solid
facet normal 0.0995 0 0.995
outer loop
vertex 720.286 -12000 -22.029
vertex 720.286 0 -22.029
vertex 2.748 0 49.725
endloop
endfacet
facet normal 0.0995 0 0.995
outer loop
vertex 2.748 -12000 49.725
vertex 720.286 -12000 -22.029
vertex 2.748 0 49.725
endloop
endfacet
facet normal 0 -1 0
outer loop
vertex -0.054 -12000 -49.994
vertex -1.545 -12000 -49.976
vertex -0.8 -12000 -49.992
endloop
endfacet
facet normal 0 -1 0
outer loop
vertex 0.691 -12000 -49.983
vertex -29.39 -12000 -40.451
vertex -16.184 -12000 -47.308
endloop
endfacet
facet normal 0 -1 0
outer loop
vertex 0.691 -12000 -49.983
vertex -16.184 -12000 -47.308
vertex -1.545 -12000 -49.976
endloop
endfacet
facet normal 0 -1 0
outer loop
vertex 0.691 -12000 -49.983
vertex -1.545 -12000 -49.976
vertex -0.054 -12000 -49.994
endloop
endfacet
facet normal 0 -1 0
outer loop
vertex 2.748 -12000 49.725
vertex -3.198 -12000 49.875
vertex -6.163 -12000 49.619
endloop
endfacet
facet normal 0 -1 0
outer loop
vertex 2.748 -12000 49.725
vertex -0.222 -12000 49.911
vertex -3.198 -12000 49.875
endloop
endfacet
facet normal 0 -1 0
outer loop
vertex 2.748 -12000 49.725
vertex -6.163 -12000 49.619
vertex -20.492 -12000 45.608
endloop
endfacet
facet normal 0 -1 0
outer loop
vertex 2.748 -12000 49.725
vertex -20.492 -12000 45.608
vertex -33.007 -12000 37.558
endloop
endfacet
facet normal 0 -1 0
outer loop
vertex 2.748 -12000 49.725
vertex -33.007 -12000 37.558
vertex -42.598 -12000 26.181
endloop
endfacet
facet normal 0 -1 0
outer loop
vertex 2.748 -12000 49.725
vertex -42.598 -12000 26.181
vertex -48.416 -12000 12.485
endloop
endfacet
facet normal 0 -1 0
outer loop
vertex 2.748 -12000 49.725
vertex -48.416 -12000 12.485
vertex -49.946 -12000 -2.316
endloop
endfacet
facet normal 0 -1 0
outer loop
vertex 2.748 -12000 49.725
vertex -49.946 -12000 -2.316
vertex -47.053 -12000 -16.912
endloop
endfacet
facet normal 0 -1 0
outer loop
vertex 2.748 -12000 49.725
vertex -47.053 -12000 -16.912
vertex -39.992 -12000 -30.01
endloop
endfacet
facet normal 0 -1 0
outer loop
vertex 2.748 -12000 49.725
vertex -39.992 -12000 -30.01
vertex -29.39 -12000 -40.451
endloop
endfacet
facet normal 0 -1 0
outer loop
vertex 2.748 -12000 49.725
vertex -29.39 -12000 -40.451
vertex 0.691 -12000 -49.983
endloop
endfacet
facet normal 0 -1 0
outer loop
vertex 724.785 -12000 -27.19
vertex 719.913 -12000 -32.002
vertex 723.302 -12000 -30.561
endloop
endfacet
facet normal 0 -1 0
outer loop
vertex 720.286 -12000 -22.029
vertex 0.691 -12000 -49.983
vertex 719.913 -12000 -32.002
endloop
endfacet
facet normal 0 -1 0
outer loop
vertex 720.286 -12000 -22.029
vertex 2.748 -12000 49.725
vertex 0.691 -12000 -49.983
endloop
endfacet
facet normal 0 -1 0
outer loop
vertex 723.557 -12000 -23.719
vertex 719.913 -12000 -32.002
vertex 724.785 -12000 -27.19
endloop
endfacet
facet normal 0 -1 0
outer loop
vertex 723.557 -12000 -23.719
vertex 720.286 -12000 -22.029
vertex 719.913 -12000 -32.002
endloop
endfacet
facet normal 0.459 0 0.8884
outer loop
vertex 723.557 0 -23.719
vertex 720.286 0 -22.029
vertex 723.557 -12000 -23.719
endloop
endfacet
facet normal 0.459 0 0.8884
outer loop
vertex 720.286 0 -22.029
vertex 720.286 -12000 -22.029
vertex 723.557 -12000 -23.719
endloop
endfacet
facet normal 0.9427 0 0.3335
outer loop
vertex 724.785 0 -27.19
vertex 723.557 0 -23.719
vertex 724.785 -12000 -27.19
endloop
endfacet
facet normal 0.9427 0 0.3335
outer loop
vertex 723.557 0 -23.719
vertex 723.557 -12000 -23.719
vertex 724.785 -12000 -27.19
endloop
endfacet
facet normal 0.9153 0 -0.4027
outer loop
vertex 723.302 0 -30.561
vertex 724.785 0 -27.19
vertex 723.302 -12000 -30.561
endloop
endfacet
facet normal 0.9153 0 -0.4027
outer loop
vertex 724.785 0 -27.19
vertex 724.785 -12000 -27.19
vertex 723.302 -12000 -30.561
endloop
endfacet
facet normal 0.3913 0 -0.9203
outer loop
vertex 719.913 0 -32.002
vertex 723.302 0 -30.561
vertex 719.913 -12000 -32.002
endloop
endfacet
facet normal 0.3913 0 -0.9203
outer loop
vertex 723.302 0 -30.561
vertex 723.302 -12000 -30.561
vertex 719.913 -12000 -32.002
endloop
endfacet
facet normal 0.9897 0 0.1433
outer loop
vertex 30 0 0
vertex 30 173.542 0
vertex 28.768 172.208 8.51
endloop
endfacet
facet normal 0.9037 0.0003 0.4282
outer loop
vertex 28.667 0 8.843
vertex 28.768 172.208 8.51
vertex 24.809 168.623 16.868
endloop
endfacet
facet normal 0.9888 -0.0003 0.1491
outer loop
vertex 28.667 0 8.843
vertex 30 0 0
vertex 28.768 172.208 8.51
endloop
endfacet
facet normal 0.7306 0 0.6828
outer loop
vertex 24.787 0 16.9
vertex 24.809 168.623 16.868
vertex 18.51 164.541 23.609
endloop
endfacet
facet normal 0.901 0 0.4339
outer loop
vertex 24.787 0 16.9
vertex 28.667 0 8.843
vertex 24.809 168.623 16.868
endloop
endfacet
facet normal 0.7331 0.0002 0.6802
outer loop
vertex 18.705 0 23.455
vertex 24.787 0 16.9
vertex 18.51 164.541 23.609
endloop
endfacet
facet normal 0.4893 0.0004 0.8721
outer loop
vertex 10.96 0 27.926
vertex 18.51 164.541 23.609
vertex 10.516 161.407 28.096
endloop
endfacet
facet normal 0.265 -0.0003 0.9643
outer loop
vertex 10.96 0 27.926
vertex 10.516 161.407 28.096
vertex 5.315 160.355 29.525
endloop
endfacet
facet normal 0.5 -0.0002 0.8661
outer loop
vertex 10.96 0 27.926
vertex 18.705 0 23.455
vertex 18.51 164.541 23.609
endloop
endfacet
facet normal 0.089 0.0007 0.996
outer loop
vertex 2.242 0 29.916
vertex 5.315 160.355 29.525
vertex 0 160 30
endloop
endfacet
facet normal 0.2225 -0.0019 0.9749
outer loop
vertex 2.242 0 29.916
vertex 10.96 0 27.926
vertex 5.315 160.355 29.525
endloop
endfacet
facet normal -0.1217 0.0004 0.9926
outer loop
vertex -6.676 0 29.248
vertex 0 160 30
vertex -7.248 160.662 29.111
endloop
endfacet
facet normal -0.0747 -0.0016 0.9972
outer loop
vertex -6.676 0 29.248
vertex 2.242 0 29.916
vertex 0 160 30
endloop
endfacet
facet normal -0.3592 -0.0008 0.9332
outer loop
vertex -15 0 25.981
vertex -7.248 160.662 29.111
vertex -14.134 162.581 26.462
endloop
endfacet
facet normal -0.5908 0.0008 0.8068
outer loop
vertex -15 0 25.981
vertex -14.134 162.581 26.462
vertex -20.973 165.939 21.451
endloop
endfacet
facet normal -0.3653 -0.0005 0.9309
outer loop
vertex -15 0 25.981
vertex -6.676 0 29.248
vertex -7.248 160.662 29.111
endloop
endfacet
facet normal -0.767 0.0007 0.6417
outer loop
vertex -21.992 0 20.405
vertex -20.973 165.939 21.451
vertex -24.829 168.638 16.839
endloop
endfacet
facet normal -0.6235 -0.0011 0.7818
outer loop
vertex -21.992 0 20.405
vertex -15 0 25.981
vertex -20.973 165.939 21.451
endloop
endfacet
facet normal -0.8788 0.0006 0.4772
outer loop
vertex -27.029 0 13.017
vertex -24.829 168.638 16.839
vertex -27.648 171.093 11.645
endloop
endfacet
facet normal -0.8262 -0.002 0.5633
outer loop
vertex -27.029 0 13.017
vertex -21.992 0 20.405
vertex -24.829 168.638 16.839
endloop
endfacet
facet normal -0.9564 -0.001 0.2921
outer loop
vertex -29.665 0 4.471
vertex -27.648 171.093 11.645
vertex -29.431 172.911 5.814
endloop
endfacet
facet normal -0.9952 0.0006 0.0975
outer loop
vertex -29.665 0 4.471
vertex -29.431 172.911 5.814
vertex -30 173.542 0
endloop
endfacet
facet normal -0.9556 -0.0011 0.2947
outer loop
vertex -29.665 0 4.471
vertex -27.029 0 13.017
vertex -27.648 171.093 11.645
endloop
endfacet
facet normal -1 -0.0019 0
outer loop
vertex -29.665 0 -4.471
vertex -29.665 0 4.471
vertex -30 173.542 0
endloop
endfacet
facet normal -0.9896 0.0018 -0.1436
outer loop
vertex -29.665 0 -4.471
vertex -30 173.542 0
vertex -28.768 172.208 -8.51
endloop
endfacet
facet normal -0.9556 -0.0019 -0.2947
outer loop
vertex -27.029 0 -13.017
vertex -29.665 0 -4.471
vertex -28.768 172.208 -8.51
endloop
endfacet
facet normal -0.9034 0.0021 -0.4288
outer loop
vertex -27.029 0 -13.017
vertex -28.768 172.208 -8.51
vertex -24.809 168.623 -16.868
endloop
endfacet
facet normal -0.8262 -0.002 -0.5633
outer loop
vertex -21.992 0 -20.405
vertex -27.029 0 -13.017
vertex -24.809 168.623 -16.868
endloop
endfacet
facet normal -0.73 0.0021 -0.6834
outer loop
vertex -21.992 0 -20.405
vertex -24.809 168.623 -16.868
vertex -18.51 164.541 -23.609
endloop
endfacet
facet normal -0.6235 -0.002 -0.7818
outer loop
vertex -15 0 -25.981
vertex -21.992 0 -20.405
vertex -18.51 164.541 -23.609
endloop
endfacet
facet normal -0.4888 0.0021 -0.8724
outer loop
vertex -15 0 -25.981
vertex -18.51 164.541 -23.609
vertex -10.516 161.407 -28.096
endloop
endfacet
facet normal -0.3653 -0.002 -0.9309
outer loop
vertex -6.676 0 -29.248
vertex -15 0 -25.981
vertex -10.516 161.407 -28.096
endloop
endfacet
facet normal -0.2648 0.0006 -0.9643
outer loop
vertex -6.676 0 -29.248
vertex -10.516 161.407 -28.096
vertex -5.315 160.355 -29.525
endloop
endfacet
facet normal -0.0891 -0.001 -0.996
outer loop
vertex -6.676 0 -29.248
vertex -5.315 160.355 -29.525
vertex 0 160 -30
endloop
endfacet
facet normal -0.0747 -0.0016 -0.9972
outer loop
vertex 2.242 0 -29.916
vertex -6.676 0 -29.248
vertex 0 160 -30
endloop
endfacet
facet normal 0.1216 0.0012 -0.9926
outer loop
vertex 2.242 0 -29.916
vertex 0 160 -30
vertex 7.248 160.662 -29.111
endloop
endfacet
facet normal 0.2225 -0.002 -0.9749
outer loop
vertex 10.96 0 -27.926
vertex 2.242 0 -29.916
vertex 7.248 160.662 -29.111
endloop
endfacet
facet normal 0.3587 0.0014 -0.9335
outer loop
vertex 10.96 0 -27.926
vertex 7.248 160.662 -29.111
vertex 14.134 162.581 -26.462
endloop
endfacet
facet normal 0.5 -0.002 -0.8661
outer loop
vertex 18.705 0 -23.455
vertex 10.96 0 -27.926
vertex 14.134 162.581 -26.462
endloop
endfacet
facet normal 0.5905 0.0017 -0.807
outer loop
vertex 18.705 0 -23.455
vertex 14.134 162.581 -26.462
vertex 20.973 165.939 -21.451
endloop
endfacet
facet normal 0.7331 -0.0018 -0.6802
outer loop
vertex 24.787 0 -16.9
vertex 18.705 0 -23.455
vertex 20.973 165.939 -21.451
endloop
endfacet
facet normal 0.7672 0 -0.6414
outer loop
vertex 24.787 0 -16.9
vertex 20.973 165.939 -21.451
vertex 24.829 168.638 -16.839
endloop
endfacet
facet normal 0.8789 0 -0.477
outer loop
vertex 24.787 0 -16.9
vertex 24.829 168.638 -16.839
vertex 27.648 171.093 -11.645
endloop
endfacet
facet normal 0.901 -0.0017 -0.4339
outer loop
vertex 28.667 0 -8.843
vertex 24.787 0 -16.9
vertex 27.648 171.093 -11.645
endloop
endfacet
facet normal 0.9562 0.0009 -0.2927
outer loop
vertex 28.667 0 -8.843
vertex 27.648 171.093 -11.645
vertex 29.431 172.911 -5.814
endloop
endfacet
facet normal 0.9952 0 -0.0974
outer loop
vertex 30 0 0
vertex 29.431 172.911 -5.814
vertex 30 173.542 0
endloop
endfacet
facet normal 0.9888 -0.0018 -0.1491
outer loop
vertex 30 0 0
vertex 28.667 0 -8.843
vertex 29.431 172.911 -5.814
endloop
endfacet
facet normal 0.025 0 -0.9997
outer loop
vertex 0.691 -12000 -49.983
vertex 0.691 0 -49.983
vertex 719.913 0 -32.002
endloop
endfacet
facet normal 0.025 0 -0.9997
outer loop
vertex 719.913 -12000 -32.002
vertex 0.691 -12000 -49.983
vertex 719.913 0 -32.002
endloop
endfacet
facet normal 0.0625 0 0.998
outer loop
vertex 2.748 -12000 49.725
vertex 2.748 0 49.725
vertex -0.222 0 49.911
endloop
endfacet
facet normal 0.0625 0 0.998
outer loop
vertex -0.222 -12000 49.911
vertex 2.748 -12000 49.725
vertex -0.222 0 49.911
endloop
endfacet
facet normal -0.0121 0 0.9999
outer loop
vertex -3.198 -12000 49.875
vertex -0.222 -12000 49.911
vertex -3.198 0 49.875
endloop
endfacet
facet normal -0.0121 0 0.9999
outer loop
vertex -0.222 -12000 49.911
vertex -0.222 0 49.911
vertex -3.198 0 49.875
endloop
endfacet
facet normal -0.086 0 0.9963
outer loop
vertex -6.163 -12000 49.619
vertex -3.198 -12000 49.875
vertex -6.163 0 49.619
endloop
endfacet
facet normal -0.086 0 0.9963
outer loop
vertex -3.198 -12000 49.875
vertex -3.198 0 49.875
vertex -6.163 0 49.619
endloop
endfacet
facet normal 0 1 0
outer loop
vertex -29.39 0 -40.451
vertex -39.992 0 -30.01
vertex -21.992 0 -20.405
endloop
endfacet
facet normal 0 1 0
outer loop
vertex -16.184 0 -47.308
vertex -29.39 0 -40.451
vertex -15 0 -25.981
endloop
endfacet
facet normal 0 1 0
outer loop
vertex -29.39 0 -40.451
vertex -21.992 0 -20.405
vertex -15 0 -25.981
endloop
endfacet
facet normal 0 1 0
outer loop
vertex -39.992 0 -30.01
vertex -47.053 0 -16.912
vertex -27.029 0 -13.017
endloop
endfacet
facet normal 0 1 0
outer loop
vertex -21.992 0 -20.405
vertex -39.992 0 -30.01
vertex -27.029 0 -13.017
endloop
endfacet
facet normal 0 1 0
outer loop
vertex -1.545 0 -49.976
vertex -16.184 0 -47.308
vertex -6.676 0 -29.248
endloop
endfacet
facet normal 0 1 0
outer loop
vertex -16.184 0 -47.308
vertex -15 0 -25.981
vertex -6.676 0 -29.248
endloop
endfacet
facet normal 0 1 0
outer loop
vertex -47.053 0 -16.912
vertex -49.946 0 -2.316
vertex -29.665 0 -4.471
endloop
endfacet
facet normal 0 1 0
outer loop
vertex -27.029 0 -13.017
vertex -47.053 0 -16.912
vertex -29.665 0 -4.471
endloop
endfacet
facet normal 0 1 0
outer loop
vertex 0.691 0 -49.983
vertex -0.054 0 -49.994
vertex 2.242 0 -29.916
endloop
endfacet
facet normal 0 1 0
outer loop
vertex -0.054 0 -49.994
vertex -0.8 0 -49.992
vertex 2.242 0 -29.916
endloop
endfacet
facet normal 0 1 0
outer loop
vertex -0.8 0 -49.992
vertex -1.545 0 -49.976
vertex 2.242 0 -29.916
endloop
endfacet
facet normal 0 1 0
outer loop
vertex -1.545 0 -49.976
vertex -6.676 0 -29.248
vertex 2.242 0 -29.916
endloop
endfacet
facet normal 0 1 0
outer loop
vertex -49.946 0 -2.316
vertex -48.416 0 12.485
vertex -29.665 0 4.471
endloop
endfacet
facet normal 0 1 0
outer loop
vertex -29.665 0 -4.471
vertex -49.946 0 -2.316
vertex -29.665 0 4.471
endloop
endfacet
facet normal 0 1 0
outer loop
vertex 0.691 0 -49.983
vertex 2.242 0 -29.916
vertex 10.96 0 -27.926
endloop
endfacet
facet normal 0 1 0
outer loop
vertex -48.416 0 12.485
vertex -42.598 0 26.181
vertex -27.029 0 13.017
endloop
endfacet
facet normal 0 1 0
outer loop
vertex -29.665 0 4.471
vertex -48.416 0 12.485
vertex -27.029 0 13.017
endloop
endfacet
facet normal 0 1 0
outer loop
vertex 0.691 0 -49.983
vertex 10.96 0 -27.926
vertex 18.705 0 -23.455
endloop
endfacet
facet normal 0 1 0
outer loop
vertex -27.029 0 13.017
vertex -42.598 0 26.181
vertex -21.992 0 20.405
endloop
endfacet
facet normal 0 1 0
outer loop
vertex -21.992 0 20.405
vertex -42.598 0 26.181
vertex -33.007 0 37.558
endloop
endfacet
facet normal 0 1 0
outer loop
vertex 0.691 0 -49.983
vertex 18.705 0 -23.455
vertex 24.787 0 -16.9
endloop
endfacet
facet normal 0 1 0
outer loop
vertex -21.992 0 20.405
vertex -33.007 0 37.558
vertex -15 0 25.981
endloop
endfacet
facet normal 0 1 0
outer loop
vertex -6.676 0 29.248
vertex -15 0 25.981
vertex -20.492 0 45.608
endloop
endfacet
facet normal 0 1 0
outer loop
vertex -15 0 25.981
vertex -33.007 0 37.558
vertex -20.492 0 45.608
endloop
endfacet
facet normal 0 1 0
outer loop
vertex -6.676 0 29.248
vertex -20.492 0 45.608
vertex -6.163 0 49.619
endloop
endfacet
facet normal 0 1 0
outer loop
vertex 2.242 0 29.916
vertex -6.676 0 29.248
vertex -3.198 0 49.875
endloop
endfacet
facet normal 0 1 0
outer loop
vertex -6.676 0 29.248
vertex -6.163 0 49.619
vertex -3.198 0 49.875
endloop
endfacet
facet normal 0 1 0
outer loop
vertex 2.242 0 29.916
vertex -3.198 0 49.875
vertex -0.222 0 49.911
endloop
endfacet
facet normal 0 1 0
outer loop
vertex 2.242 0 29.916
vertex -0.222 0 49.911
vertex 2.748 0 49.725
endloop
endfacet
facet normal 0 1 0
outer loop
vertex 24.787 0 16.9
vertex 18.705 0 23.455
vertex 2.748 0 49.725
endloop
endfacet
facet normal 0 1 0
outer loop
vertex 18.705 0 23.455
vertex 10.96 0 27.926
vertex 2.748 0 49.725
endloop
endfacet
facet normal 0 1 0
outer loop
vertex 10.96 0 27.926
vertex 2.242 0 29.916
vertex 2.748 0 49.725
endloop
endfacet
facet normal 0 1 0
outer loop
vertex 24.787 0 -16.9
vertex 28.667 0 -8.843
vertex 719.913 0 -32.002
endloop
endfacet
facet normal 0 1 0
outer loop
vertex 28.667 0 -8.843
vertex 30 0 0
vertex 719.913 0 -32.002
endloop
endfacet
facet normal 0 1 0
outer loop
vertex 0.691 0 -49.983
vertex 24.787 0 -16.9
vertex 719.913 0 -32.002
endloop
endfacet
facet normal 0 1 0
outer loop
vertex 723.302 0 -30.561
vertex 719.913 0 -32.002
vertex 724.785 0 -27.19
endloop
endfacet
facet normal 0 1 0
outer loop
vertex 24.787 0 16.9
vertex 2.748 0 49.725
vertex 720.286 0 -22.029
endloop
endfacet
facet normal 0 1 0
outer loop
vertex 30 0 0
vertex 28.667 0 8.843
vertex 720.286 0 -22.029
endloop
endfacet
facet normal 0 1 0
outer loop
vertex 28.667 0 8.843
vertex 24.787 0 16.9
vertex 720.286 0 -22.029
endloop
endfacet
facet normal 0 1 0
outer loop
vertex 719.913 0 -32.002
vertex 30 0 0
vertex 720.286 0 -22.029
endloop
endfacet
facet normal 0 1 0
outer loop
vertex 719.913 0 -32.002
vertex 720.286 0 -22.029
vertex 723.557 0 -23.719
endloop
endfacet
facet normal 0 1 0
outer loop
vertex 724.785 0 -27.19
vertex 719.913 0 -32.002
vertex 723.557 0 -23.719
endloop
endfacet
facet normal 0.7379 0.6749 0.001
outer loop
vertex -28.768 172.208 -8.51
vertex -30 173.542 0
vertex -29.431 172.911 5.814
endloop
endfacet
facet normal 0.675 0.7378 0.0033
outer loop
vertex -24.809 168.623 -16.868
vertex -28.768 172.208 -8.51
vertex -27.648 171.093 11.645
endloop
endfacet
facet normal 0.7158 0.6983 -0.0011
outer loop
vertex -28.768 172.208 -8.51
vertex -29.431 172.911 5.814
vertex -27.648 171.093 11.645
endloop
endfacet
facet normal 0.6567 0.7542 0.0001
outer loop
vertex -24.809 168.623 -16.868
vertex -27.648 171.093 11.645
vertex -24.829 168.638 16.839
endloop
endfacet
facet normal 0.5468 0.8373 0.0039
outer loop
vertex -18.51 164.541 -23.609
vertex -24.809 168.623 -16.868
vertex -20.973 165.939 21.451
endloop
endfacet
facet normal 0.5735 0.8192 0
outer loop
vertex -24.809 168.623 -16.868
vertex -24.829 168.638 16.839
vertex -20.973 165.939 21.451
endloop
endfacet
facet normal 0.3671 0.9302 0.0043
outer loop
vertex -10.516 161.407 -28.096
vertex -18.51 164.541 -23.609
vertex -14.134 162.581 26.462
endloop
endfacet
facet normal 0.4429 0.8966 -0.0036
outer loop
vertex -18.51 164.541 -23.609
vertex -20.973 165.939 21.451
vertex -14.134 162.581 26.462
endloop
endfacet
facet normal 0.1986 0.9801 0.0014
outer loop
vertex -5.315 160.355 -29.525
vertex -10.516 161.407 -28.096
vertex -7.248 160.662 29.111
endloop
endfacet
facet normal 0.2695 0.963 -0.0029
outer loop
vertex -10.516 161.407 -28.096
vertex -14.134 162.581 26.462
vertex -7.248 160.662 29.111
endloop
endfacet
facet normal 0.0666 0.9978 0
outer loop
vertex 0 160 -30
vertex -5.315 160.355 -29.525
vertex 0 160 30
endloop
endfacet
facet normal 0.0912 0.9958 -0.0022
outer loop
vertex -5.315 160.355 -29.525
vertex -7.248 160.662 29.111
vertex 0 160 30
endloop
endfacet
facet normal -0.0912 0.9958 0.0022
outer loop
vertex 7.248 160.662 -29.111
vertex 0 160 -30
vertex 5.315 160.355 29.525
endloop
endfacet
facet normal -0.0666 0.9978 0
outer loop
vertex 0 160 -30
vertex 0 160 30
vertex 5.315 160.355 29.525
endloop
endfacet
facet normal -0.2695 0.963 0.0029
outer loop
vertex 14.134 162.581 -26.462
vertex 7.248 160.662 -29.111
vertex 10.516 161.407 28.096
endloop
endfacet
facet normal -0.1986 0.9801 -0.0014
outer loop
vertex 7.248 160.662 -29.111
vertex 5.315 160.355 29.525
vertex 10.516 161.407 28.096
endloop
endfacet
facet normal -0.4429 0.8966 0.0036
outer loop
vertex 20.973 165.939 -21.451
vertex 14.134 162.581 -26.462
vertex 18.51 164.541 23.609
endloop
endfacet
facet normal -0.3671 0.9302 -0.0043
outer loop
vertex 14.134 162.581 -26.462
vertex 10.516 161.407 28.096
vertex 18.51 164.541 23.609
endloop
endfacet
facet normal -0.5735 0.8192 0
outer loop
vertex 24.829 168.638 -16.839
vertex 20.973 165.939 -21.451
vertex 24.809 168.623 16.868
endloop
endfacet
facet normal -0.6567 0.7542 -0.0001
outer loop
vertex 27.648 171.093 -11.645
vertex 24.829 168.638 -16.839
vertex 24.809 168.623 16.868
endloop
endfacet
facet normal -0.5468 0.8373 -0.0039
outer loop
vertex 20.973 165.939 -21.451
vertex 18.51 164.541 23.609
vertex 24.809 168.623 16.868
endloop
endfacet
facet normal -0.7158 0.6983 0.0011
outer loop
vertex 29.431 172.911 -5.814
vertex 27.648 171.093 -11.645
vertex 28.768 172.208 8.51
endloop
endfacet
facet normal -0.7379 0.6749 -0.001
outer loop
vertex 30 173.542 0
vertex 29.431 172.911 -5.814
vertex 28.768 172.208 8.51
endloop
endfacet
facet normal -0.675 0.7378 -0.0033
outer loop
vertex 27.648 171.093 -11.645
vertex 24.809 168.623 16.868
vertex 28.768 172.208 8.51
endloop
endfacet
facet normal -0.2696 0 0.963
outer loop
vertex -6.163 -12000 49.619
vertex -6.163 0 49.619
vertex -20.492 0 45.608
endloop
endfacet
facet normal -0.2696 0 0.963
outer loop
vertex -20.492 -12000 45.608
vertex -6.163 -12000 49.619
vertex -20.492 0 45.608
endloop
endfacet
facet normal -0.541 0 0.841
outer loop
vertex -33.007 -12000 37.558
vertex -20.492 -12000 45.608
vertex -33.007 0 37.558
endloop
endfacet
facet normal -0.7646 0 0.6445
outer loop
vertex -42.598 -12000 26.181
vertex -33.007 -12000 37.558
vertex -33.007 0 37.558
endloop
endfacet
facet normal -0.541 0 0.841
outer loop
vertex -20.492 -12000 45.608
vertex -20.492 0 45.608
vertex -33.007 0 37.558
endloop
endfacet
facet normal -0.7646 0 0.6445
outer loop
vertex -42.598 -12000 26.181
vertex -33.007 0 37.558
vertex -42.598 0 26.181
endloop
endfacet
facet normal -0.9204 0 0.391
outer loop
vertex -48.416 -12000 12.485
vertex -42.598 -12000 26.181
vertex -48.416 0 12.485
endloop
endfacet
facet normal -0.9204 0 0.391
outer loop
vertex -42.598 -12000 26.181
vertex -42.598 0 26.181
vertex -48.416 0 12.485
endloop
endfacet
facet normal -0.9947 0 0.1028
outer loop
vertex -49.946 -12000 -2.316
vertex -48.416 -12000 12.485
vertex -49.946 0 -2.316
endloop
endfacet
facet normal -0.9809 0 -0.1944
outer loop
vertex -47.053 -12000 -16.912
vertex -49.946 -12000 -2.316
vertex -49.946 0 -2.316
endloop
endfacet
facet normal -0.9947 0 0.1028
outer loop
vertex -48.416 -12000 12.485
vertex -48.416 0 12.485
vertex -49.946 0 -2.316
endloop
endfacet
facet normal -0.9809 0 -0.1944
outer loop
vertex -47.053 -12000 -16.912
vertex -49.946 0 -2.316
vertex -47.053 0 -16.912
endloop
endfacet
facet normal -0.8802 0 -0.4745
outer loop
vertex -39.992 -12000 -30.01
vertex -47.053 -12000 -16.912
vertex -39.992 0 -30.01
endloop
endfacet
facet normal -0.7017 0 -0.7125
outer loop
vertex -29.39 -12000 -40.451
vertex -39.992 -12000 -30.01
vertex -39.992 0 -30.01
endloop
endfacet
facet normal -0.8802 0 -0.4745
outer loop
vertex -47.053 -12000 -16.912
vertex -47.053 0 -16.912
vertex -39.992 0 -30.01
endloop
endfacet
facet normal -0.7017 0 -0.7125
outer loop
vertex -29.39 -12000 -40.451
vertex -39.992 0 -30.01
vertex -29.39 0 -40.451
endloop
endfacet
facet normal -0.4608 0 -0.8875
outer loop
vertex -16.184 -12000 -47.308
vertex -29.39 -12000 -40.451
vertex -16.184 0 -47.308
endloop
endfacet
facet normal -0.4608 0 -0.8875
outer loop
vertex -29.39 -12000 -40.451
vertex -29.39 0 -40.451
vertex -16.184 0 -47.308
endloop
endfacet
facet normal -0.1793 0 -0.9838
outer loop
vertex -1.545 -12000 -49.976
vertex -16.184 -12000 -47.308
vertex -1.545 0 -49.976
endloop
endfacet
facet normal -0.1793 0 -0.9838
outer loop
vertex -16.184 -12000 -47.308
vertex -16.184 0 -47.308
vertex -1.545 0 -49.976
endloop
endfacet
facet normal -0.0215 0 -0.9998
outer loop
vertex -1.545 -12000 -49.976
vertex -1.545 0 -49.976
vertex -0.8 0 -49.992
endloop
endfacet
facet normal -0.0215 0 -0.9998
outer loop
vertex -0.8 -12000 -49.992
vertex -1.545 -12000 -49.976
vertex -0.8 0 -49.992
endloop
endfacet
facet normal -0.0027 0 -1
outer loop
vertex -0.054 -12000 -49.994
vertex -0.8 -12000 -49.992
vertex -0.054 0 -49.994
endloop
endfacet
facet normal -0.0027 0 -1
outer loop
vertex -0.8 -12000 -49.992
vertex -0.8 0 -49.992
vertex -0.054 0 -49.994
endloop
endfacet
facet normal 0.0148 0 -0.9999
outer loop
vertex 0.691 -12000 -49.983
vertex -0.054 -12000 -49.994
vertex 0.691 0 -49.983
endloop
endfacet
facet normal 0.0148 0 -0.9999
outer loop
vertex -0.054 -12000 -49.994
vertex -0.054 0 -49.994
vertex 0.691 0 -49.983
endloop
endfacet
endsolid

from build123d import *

# Parameters (mm, degrees)
F1_DEPTH    = 12000
F2_T1_DEPTH = 12030.8724111993
F2_T3_DEPTH = 12007.7249640069
F3_R        = 5
F4_R        = 30
F5_DEPTH    = 200
F7_DEPTH    = 50


# Not quite as in the source:
# - a fillet or chamfer that OpenCascade refuses, or shapes differently, is made with other operations: its cross-section is extruded or revolved along the edge and cut away or added


with BuildPart() as f1:
    # F0 (on Front) → F1 (new body)
    with BuildSketch(Plane.XZ):
        with BuildLine():
            Line((0, -30), (0, 50))
            ThreePointArc((0, 50), (-50, 0), (0, -50))
            Line((0, -50), (0, -30))
        make_face()
        Polygon((800, -30), (0, 50), (0, -30), align=None)
        Polygon((800, -30), (0, -30), (0, -50), align=None)
    extrude(amount=F1_DEPTH)

    # F2: fillet of radius 40 on 2 edges, made by hand

    # F2_s2 → F2_t1 (cut)
    with BuildSketch(Plane.XZ.offset(-15.4362055996)):
        with BuildLine():
            ThreePointArc((2.7476085346, 49.7252391465), (-1.7105207108, 49.9208956194), (-6.1627011311, 49.6187576907))
            ThreePointArc((-6.1627011311, 49.6187576907), (-3.0872411199, 49.904598408), (0, 50))
            Line((0, 50), (2.7476085346, 49.7252391465))
        make_face()
    extrude(amount=F2_T1_DEPTH, mode=Mode.SUBTRACT)

    # F2_s4 → F2_t3 (cut)
    with BuildSketch(Plane.XZ.offset(-3.8624820034)):
        with BuildLine():
            ThreePointArc((-1.5448083953, -49.9761299724), (-0.4270873442, -49.9950515732), (0.6907259674, -49.9827318508))
            Line((0.6907259674, -49.9827318508), (0, -50))
            ThreePointArc((0, -50), (-0.7724964007, -49.994032137), (-1.5448083953, -49.9761299724))
        make_face()
    extrude(amount=F2_T3_DEPTH, mode=Mode.SUBTRACT)

    # F3
    f3_edges = [f1.edges().sort_by_distance(p)[0] for p in [
        (800, -6000, -30),
    ]]
    fillet(f3_edges, radius=F3_R)

    # F4 (on Front) → F5 (join)
    with BuildSketch(Plane.XZ):
        Circle(F4_R)
    extrude(amount=-F5_DEPTH)

    # F6 (on Top) → F7 (cut, symmetric)
    with BuildSketch(Plane.XY):
        with BuildLine():
            ThreePointArc((0, 160), (28.2842712475, 171.7157287525), (40, 200))
            ThreePointArc((40, 200), (-28.2842712475, 228.2842712475), (0, 160))
        make_face()
    extrude(amount=F7_DEPTH, both=True, mode=Mode.SUBTRACT)


solid = f1.part
